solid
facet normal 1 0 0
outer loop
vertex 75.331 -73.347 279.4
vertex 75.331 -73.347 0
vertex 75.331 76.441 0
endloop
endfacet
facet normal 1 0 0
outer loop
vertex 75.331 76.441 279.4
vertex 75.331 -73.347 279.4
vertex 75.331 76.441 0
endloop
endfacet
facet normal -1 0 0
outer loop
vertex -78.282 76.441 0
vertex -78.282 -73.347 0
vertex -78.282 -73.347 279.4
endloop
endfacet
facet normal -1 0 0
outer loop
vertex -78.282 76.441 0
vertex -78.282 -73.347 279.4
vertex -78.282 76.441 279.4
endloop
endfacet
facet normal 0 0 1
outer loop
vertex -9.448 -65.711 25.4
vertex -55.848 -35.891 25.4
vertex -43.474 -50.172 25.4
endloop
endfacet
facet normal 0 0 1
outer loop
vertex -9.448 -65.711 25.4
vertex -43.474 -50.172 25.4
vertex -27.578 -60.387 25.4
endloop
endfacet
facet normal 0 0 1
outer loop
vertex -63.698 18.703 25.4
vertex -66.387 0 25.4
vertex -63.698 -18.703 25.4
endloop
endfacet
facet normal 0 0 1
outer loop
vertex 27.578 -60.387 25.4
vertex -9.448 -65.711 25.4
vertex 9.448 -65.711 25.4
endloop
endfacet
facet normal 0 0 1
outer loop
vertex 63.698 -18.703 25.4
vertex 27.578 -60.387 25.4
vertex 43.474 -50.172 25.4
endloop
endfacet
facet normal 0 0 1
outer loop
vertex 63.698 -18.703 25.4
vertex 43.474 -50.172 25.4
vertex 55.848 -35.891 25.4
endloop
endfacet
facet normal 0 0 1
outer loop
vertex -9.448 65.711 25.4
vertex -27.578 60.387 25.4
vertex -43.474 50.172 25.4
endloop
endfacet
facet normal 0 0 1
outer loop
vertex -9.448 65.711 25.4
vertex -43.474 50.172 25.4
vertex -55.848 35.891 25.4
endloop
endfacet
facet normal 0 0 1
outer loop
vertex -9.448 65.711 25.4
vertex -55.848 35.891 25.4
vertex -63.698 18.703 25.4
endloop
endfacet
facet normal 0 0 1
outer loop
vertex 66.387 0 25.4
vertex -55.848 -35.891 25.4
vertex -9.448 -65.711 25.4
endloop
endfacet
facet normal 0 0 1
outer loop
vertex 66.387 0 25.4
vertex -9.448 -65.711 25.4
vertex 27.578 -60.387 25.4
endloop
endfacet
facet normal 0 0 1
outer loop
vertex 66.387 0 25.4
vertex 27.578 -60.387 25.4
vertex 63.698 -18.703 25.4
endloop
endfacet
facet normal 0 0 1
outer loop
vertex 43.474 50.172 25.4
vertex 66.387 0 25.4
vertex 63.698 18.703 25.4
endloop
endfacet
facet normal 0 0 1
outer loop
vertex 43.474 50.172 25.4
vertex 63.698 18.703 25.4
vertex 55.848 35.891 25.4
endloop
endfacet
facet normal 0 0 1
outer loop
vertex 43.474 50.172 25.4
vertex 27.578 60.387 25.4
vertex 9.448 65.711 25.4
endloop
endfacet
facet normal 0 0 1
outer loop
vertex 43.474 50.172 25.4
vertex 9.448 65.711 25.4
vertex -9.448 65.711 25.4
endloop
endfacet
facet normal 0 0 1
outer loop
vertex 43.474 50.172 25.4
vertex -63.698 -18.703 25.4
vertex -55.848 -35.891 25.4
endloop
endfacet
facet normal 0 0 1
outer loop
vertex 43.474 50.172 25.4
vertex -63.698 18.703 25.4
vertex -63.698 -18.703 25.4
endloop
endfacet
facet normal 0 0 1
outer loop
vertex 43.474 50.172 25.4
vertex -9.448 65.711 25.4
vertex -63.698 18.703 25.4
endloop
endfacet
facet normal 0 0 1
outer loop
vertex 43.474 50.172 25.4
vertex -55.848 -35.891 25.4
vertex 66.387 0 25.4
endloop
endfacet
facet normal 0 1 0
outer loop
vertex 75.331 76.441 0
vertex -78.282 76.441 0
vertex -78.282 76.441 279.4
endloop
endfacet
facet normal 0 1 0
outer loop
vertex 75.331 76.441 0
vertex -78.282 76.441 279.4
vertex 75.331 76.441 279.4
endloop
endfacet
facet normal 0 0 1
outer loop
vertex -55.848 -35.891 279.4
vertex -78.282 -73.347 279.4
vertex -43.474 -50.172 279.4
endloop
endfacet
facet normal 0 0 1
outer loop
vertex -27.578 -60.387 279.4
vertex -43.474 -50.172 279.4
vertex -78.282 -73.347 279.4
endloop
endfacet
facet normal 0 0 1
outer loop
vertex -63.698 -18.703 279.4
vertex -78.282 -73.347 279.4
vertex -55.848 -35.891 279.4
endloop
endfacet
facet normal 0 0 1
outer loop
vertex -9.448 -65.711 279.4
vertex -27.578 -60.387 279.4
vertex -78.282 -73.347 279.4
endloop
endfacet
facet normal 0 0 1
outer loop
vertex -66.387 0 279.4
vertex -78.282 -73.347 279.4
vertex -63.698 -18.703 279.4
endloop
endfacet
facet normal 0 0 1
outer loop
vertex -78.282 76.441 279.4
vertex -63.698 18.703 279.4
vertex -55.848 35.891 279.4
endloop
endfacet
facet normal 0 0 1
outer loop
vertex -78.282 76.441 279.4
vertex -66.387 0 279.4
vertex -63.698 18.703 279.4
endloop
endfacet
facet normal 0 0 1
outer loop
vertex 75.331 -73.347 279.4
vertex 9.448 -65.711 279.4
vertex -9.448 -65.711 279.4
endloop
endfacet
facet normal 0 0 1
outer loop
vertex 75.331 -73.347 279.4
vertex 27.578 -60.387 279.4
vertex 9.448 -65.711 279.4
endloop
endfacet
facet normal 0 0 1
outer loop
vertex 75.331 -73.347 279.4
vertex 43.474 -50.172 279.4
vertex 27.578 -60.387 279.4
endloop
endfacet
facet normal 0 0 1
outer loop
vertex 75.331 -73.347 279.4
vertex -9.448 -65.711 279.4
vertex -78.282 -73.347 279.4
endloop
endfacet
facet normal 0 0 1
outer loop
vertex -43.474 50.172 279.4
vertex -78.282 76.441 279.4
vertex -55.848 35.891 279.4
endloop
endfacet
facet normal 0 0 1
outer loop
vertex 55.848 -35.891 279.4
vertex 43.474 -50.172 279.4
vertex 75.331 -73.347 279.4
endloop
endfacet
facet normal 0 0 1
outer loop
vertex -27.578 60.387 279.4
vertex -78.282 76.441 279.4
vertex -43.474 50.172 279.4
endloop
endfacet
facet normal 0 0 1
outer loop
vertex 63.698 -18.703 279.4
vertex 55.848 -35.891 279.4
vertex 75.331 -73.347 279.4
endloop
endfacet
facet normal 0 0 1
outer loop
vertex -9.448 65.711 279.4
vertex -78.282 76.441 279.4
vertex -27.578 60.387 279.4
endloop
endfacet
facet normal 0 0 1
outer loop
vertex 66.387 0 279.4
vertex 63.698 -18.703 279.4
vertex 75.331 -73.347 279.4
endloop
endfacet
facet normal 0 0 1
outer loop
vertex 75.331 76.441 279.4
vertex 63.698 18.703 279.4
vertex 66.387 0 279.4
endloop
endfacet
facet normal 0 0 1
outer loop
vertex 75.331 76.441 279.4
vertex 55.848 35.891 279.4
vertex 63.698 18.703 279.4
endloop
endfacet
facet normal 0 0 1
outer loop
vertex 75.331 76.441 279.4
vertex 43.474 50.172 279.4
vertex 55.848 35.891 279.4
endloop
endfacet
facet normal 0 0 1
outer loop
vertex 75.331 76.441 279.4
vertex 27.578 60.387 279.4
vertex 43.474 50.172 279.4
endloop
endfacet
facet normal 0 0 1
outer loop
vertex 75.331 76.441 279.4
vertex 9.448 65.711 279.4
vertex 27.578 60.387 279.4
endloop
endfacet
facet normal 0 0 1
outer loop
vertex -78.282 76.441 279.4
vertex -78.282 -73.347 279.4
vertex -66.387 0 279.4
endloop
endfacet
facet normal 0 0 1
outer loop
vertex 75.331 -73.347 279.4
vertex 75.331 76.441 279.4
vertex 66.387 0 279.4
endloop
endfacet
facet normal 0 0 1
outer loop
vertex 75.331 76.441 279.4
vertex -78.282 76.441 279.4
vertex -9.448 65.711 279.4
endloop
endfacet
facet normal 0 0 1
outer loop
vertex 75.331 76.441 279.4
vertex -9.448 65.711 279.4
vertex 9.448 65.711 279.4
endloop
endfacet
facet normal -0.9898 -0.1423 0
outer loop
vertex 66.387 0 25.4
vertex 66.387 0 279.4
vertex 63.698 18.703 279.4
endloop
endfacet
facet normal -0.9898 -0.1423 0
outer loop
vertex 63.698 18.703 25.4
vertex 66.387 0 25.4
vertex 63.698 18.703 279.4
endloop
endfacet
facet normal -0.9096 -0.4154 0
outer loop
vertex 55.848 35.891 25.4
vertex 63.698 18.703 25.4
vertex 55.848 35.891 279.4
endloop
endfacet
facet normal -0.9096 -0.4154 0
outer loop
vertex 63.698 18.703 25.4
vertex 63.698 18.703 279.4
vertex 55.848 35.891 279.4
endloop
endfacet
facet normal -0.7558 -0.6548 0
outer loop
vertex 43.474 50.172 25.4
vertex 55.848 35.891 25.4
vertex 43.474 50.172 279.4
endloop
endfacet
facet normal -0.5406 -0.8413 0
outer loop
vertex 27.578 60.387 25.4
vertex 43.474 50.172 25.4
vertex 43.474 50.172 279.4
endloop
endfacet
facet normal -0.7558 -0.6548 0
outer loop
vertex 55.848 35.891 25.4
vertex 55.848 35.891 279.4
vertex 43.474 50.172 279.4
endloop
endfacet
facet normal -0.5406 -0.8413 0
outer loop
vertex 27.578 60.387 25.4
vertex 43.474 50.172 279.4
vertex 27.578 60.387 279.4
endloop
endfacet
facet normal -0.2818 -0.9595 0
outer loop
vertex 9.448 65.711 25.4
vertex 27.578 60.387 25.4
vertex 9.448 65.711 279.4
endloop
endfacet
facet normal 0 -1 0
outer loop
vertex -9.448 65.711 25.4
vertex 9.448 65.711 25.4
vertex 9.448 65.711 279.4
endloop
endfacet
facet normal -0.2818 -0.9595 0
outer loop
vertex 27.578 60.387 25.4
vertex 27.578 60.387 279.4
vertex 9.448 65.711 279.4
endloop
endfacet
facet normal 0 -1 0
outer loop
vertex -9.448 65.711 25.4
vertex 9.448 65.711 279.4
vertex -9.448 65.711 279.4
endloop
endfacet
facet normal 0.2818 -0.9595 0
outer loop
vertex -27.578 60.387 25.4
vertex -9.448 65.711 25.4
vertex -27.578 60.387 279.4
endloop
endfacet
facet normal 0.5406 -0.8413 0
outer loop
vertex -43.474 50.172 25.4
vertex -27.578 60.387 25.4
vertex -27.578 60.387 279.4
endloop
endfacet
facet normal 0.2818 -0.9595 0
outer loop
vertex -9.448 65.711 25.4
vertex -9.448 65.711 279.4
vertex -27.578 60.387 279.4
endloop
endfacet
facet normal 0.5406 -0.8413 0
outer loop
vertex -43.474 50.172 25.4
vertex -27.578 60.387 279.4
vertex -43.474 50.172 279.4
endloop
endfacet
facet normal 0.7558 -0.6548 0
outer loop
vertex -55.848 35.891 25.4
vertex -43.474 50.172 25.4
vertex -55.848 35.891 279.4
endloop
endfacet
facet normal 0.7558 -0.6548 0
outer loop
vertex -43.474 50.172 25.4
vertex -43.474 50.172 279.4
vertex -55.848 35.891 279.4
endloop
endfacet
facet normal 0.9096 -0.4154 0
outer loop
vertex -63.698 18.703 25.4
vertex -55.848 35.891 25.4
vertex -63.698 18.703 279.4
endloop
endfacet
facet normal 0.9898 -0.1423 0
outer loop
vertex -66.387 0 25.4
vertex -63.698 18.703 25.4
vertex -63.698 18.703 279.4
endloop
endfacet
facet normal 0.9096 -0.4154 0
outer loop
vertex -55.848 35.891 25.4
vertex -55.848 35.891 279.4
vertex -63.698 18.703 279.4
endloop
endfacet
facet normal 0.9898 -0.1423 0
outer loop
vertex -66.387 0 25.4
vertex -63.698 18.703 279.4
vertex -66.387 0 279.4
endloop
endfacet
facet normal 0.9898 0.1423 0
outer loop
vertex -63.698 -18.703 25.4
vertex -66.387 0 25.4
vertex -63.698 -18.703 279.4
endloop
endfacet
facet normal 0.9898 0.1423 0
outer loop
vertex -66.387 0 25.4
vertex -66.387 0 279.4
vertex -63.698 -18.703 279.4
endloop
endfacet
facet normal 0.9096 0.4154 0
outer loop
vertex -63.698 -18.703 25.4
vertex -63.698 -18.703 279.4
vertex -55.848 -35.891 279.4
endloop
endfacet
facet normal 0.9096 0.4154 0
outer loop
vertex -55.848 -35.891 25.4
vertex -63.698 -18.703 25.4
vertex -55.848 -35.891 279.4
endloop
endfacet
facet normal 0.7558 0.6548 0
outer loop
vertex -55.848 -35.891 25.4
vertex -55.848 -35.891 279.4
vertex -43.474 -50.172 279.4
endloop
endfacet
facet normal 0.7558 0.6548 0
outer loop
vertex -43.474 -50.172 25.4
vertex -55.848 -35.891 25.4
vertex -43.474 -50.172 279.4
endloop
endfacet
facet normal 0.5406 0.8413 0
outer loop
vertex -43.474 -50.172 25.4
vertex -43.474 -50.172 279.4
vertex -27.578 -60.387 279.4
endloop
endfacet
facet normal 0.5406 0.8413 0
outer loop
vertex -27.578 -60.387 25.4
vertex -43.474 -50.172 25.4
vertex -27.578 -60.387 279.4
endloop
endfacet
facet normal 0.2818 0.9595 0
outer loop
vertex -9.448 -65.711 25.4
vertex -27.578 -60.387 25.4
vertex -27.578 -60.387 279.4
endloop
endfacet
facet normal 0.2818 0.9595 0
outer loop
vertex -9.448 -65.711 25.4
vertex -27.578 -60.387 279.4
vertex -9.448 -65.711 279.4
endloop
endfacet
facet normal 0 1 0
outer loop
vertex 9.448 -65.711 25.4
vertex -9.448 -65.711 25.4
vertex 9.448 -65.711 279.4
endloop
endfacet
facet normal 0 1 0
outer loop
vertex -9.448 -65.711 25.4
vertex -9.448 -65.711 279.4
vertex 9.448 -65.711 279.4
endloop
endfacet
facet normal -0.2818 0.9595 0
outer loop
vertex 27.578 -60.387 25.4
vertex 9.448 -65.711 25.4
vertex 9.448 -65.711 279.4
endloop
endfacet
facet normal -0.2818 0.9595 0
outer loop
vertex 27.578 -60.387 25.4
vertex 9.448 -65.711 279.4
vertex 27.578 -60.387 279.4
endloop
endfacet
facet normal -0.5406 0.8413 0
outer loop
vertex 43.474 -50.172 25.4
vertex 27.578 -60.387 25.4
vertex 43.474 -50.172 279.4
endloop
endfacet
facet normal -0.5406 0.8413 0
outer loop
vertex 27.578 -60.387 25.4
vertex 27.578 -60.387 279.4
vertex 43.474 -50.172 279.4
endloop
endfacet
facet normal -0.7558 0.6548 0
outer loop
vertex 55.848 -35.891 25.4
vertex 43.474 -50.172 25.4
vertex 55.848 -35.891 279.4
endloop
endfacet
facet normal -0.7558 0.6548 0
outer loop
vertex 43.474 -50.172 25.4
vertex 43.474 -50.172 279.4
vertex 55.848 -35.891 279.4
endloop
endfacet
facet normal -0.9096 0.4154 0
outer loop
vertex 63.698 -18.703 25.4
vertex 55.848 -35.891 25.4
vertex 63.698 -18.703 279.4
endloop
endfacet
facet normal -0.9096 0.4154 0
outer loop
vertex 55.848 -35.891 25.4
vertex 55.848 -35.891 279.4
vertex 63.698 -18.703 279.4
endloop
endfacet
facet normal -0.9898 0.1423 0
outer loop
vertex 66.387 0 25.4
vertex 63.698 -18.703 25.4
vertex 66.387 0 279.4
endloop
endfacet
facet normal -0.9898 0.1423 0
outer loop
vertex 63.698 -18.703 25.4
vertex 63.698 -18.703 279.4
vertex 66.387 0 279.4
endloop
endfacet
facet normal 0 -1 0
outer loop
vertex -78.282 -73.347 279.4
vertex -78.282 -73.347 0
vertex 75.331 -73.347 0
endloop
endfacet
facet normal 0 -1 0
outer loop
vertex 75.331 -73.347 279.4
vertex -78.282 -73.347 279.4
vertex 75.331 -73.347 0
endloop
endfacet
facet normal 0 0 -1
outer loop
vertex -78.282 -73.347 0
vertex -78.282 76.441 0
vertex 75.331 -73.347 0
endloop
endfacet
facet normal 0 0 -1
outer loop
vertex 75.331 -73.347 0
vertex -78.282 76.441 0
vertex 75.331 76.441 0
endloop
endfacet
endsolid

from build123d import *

# Parameters (mm, degrees)
F0_W     = 153.613642
F0_H     = 149.788901
F1_DEPTH = 279.4
F2_R     = 66.386711
F3_DEPTH = 254


with BuildPart() as f1:
    # F0 (on Top) → F1 (new body)
    with BuildSketch(Plane.XY):
        with Locations((-1.47555, 1.547002)):
            Rectangle(F0_W, F0_H)
    extrude(amount=F1_DEPTH)

    # F2 (on face) → F3 (cut)
    with BuildSketch(Plane.XY.offset(279.4)):
        Circle(F2_R)
    extrude(amount=-F3_DEPTH, mode=Mode.SUBTRACT)


solid = f1.part
